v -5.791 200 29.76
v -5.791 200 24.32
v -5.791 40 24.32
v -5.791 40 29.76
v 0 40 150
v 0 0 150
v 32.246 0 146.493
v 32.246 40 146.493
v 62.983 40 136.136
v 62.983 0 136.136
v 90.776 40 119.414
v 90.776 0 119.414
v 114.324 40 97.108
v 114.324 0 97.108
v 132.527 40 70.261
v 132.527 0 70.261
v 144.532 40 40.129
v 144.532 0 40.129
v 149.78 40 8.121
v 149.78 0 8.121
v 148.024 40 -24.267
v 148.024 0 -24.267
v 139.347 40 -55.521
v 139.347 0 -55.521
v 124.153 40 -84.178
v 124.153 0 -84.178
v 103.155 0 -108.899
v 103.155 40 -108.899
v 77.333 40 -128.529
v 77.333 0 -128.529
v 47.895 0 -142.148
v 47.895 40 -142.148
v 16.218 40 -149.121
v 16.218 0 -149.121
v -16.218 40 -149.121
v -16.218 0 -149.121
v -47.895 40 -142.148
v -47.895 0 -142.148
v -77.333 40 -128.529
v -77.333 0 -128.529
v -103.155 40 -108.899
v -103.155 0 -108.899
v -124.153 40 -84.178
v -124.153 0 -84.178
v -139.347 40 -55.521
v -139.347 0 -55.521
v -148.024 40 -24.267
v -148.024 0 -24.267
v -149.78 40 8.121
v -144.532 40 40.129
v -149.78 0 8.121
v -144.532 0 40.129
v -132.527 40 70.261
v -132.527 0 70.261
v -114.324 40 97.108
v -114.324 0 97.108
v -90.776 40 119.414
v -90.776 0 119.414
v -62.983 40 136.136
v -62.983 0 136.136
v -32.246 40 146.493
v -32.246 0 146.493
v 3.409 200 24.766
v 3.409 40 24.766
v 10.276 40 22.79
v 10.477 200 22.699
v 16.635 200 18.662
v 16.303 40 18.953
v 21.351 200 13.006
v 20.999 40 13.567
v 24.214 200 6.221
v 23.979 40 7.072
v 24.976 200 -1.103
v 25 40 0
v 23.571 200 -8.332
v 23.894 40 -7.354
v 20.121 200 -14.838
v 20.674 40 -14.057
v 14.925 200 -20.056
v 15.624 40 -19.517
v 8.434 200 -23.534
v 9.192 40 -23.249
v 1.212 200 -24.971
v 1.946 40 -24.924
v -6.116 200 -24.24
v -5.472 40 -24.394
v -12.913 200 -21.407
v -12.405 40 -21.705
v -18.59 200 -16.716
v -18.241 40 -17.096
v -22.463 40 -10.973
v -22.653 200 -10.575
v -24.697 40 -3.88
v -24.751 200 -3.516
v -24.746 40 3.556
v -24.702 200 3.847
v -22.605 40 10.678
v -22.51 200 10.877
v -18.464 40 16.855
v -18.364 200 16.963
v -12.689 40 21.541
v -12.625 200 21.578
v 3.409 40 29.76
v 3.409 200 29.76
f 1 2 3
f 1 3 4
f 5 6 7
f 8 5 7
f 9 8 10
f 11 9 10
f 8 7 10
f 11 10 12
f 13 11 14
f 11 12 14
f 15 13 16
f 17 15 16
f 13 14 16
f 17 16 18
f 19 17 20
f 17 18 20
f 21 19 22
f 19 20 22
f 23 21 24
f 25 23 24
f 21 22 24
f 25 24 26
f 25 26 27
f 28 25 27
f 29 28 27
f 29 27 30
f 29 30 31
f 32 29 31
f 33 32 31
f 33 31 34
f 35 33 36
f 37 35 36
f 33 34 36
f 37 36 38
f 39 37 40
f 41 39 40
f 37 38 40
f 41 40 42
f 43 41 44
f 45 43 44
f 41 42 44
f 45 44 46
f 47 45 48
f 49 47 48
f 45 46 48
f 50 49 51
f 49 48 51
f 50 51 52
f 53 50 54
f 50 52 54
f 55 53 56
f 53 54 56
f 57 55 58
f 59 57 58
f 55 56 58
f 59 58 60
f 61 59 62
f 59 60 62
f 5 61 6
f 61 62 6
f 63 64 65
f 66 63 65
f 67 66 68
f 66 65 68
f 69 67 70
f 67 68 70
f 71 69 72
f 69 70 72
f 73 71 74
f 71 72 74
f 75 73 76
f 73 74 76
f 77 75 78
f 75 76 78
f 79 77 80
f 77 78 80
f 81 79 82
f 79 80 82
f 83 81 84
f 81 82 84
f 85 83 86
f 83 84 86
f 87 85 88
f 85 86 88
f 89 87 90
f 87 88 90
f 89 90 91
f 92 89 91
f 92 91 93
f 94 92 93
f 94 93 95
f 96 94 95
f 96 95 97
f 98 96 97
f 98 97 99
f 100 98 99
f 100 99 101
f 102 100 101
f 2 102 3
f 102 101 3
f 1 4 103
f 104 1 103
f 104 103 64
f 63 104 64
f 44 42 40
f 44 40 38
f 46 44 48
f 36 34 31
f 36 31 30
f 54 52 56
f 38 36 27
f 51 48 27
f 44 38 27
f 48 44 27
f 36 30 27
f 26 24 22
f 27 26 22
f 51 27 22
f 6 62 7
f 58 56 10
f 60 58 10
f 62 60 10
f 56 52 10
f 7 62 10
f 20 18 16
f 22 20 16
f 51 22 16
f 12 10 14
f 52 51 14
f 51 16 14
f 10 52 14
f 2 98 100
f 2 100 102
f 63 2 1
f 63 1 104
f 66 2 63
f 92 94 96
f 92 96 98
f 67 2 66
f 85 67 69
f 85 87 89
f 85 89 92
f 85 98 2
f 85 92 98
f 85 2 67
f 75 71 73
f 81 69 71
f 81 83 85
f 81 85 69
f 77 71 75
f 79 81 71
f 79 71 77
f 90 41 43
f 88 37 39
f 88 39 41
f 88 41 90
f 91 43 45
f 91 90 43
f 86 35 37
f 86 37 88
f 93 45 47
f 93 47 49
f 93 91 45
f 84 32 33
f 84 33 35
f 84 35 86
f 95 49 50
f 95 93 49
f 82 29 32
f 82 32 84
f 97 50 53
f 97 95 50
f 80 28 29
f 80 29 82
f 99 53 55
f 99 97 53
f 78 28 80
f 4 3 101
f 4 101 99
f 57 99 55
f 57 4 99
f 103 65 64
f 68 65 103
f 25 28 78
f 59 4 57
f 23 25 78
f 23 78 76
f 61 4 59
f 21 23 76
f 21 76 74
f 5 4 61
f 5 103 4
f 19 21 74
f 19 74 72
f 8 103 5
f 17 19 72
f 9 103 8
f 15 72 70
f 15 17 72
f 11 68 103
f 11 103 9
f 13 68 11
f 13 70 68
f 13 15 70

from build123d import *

# Parameters (mm, degrees)
SKETCH1_R           = 150
BOSS_EXTRUDE1_DEPTH = 40
BOSS_EXTRUDE2_DEPTH = 200


with BuildPart() as part:
    # Sketch1 → Boss-Extrude1 (new body)
    with BuildSketch(Plane(origin=(0, 0, 0), x_dir=(1, 0, 0), z_dir=(0, 1, 0))):
        Circle(SKETCH1_R)
        with BuildLine():
            Line((-5.790928426, -29.760056496), (-5.790928426, -24.320056496))
            ThreePointArc((-5.790928426, -24.320056496), (-15.49559275, 19.618527094), (25, 0))
            ThreePointArc((25, 0), (18.844452623, -16.428225873), (3.409071574, -24.766473932))
            Line((3.409071574, -24.766473932), (3.409071574, -29.760056496))
            Line((3.409071574, -29.760056496), (-5.790928426, -29.760056496))
        make_face(mode=Mode.SUBTRACT)
    extrude(amount=BOSS_EXTRUDE1_DEPTH)

    # Sketch1<3> → Boss-Extrude2 (add)
    with BuildSketch(Plane(origin=(0, 0, 0), x_dir=(1, 0, 0), z_dir=(0, 1, 0))):
        with BuildLine():
            Line((-5.790928426, -24.320056496), (-5.790928426, -29.760056496))
            Line((-5.790928426, -29.760056496), (3.409071574, -29.760056496))
            Line((3.409071574, -29.760056496), (3.409071574, -24.766473932))
            ThreePointArc((3.409071574, -24.766473932), (1.211665237, 24.970620083), (-5.790928426, -24.320056496))
        make_face()
    extrude(amount=BOSS_EXTRUDE2_DEPTH)


solid = part.part
